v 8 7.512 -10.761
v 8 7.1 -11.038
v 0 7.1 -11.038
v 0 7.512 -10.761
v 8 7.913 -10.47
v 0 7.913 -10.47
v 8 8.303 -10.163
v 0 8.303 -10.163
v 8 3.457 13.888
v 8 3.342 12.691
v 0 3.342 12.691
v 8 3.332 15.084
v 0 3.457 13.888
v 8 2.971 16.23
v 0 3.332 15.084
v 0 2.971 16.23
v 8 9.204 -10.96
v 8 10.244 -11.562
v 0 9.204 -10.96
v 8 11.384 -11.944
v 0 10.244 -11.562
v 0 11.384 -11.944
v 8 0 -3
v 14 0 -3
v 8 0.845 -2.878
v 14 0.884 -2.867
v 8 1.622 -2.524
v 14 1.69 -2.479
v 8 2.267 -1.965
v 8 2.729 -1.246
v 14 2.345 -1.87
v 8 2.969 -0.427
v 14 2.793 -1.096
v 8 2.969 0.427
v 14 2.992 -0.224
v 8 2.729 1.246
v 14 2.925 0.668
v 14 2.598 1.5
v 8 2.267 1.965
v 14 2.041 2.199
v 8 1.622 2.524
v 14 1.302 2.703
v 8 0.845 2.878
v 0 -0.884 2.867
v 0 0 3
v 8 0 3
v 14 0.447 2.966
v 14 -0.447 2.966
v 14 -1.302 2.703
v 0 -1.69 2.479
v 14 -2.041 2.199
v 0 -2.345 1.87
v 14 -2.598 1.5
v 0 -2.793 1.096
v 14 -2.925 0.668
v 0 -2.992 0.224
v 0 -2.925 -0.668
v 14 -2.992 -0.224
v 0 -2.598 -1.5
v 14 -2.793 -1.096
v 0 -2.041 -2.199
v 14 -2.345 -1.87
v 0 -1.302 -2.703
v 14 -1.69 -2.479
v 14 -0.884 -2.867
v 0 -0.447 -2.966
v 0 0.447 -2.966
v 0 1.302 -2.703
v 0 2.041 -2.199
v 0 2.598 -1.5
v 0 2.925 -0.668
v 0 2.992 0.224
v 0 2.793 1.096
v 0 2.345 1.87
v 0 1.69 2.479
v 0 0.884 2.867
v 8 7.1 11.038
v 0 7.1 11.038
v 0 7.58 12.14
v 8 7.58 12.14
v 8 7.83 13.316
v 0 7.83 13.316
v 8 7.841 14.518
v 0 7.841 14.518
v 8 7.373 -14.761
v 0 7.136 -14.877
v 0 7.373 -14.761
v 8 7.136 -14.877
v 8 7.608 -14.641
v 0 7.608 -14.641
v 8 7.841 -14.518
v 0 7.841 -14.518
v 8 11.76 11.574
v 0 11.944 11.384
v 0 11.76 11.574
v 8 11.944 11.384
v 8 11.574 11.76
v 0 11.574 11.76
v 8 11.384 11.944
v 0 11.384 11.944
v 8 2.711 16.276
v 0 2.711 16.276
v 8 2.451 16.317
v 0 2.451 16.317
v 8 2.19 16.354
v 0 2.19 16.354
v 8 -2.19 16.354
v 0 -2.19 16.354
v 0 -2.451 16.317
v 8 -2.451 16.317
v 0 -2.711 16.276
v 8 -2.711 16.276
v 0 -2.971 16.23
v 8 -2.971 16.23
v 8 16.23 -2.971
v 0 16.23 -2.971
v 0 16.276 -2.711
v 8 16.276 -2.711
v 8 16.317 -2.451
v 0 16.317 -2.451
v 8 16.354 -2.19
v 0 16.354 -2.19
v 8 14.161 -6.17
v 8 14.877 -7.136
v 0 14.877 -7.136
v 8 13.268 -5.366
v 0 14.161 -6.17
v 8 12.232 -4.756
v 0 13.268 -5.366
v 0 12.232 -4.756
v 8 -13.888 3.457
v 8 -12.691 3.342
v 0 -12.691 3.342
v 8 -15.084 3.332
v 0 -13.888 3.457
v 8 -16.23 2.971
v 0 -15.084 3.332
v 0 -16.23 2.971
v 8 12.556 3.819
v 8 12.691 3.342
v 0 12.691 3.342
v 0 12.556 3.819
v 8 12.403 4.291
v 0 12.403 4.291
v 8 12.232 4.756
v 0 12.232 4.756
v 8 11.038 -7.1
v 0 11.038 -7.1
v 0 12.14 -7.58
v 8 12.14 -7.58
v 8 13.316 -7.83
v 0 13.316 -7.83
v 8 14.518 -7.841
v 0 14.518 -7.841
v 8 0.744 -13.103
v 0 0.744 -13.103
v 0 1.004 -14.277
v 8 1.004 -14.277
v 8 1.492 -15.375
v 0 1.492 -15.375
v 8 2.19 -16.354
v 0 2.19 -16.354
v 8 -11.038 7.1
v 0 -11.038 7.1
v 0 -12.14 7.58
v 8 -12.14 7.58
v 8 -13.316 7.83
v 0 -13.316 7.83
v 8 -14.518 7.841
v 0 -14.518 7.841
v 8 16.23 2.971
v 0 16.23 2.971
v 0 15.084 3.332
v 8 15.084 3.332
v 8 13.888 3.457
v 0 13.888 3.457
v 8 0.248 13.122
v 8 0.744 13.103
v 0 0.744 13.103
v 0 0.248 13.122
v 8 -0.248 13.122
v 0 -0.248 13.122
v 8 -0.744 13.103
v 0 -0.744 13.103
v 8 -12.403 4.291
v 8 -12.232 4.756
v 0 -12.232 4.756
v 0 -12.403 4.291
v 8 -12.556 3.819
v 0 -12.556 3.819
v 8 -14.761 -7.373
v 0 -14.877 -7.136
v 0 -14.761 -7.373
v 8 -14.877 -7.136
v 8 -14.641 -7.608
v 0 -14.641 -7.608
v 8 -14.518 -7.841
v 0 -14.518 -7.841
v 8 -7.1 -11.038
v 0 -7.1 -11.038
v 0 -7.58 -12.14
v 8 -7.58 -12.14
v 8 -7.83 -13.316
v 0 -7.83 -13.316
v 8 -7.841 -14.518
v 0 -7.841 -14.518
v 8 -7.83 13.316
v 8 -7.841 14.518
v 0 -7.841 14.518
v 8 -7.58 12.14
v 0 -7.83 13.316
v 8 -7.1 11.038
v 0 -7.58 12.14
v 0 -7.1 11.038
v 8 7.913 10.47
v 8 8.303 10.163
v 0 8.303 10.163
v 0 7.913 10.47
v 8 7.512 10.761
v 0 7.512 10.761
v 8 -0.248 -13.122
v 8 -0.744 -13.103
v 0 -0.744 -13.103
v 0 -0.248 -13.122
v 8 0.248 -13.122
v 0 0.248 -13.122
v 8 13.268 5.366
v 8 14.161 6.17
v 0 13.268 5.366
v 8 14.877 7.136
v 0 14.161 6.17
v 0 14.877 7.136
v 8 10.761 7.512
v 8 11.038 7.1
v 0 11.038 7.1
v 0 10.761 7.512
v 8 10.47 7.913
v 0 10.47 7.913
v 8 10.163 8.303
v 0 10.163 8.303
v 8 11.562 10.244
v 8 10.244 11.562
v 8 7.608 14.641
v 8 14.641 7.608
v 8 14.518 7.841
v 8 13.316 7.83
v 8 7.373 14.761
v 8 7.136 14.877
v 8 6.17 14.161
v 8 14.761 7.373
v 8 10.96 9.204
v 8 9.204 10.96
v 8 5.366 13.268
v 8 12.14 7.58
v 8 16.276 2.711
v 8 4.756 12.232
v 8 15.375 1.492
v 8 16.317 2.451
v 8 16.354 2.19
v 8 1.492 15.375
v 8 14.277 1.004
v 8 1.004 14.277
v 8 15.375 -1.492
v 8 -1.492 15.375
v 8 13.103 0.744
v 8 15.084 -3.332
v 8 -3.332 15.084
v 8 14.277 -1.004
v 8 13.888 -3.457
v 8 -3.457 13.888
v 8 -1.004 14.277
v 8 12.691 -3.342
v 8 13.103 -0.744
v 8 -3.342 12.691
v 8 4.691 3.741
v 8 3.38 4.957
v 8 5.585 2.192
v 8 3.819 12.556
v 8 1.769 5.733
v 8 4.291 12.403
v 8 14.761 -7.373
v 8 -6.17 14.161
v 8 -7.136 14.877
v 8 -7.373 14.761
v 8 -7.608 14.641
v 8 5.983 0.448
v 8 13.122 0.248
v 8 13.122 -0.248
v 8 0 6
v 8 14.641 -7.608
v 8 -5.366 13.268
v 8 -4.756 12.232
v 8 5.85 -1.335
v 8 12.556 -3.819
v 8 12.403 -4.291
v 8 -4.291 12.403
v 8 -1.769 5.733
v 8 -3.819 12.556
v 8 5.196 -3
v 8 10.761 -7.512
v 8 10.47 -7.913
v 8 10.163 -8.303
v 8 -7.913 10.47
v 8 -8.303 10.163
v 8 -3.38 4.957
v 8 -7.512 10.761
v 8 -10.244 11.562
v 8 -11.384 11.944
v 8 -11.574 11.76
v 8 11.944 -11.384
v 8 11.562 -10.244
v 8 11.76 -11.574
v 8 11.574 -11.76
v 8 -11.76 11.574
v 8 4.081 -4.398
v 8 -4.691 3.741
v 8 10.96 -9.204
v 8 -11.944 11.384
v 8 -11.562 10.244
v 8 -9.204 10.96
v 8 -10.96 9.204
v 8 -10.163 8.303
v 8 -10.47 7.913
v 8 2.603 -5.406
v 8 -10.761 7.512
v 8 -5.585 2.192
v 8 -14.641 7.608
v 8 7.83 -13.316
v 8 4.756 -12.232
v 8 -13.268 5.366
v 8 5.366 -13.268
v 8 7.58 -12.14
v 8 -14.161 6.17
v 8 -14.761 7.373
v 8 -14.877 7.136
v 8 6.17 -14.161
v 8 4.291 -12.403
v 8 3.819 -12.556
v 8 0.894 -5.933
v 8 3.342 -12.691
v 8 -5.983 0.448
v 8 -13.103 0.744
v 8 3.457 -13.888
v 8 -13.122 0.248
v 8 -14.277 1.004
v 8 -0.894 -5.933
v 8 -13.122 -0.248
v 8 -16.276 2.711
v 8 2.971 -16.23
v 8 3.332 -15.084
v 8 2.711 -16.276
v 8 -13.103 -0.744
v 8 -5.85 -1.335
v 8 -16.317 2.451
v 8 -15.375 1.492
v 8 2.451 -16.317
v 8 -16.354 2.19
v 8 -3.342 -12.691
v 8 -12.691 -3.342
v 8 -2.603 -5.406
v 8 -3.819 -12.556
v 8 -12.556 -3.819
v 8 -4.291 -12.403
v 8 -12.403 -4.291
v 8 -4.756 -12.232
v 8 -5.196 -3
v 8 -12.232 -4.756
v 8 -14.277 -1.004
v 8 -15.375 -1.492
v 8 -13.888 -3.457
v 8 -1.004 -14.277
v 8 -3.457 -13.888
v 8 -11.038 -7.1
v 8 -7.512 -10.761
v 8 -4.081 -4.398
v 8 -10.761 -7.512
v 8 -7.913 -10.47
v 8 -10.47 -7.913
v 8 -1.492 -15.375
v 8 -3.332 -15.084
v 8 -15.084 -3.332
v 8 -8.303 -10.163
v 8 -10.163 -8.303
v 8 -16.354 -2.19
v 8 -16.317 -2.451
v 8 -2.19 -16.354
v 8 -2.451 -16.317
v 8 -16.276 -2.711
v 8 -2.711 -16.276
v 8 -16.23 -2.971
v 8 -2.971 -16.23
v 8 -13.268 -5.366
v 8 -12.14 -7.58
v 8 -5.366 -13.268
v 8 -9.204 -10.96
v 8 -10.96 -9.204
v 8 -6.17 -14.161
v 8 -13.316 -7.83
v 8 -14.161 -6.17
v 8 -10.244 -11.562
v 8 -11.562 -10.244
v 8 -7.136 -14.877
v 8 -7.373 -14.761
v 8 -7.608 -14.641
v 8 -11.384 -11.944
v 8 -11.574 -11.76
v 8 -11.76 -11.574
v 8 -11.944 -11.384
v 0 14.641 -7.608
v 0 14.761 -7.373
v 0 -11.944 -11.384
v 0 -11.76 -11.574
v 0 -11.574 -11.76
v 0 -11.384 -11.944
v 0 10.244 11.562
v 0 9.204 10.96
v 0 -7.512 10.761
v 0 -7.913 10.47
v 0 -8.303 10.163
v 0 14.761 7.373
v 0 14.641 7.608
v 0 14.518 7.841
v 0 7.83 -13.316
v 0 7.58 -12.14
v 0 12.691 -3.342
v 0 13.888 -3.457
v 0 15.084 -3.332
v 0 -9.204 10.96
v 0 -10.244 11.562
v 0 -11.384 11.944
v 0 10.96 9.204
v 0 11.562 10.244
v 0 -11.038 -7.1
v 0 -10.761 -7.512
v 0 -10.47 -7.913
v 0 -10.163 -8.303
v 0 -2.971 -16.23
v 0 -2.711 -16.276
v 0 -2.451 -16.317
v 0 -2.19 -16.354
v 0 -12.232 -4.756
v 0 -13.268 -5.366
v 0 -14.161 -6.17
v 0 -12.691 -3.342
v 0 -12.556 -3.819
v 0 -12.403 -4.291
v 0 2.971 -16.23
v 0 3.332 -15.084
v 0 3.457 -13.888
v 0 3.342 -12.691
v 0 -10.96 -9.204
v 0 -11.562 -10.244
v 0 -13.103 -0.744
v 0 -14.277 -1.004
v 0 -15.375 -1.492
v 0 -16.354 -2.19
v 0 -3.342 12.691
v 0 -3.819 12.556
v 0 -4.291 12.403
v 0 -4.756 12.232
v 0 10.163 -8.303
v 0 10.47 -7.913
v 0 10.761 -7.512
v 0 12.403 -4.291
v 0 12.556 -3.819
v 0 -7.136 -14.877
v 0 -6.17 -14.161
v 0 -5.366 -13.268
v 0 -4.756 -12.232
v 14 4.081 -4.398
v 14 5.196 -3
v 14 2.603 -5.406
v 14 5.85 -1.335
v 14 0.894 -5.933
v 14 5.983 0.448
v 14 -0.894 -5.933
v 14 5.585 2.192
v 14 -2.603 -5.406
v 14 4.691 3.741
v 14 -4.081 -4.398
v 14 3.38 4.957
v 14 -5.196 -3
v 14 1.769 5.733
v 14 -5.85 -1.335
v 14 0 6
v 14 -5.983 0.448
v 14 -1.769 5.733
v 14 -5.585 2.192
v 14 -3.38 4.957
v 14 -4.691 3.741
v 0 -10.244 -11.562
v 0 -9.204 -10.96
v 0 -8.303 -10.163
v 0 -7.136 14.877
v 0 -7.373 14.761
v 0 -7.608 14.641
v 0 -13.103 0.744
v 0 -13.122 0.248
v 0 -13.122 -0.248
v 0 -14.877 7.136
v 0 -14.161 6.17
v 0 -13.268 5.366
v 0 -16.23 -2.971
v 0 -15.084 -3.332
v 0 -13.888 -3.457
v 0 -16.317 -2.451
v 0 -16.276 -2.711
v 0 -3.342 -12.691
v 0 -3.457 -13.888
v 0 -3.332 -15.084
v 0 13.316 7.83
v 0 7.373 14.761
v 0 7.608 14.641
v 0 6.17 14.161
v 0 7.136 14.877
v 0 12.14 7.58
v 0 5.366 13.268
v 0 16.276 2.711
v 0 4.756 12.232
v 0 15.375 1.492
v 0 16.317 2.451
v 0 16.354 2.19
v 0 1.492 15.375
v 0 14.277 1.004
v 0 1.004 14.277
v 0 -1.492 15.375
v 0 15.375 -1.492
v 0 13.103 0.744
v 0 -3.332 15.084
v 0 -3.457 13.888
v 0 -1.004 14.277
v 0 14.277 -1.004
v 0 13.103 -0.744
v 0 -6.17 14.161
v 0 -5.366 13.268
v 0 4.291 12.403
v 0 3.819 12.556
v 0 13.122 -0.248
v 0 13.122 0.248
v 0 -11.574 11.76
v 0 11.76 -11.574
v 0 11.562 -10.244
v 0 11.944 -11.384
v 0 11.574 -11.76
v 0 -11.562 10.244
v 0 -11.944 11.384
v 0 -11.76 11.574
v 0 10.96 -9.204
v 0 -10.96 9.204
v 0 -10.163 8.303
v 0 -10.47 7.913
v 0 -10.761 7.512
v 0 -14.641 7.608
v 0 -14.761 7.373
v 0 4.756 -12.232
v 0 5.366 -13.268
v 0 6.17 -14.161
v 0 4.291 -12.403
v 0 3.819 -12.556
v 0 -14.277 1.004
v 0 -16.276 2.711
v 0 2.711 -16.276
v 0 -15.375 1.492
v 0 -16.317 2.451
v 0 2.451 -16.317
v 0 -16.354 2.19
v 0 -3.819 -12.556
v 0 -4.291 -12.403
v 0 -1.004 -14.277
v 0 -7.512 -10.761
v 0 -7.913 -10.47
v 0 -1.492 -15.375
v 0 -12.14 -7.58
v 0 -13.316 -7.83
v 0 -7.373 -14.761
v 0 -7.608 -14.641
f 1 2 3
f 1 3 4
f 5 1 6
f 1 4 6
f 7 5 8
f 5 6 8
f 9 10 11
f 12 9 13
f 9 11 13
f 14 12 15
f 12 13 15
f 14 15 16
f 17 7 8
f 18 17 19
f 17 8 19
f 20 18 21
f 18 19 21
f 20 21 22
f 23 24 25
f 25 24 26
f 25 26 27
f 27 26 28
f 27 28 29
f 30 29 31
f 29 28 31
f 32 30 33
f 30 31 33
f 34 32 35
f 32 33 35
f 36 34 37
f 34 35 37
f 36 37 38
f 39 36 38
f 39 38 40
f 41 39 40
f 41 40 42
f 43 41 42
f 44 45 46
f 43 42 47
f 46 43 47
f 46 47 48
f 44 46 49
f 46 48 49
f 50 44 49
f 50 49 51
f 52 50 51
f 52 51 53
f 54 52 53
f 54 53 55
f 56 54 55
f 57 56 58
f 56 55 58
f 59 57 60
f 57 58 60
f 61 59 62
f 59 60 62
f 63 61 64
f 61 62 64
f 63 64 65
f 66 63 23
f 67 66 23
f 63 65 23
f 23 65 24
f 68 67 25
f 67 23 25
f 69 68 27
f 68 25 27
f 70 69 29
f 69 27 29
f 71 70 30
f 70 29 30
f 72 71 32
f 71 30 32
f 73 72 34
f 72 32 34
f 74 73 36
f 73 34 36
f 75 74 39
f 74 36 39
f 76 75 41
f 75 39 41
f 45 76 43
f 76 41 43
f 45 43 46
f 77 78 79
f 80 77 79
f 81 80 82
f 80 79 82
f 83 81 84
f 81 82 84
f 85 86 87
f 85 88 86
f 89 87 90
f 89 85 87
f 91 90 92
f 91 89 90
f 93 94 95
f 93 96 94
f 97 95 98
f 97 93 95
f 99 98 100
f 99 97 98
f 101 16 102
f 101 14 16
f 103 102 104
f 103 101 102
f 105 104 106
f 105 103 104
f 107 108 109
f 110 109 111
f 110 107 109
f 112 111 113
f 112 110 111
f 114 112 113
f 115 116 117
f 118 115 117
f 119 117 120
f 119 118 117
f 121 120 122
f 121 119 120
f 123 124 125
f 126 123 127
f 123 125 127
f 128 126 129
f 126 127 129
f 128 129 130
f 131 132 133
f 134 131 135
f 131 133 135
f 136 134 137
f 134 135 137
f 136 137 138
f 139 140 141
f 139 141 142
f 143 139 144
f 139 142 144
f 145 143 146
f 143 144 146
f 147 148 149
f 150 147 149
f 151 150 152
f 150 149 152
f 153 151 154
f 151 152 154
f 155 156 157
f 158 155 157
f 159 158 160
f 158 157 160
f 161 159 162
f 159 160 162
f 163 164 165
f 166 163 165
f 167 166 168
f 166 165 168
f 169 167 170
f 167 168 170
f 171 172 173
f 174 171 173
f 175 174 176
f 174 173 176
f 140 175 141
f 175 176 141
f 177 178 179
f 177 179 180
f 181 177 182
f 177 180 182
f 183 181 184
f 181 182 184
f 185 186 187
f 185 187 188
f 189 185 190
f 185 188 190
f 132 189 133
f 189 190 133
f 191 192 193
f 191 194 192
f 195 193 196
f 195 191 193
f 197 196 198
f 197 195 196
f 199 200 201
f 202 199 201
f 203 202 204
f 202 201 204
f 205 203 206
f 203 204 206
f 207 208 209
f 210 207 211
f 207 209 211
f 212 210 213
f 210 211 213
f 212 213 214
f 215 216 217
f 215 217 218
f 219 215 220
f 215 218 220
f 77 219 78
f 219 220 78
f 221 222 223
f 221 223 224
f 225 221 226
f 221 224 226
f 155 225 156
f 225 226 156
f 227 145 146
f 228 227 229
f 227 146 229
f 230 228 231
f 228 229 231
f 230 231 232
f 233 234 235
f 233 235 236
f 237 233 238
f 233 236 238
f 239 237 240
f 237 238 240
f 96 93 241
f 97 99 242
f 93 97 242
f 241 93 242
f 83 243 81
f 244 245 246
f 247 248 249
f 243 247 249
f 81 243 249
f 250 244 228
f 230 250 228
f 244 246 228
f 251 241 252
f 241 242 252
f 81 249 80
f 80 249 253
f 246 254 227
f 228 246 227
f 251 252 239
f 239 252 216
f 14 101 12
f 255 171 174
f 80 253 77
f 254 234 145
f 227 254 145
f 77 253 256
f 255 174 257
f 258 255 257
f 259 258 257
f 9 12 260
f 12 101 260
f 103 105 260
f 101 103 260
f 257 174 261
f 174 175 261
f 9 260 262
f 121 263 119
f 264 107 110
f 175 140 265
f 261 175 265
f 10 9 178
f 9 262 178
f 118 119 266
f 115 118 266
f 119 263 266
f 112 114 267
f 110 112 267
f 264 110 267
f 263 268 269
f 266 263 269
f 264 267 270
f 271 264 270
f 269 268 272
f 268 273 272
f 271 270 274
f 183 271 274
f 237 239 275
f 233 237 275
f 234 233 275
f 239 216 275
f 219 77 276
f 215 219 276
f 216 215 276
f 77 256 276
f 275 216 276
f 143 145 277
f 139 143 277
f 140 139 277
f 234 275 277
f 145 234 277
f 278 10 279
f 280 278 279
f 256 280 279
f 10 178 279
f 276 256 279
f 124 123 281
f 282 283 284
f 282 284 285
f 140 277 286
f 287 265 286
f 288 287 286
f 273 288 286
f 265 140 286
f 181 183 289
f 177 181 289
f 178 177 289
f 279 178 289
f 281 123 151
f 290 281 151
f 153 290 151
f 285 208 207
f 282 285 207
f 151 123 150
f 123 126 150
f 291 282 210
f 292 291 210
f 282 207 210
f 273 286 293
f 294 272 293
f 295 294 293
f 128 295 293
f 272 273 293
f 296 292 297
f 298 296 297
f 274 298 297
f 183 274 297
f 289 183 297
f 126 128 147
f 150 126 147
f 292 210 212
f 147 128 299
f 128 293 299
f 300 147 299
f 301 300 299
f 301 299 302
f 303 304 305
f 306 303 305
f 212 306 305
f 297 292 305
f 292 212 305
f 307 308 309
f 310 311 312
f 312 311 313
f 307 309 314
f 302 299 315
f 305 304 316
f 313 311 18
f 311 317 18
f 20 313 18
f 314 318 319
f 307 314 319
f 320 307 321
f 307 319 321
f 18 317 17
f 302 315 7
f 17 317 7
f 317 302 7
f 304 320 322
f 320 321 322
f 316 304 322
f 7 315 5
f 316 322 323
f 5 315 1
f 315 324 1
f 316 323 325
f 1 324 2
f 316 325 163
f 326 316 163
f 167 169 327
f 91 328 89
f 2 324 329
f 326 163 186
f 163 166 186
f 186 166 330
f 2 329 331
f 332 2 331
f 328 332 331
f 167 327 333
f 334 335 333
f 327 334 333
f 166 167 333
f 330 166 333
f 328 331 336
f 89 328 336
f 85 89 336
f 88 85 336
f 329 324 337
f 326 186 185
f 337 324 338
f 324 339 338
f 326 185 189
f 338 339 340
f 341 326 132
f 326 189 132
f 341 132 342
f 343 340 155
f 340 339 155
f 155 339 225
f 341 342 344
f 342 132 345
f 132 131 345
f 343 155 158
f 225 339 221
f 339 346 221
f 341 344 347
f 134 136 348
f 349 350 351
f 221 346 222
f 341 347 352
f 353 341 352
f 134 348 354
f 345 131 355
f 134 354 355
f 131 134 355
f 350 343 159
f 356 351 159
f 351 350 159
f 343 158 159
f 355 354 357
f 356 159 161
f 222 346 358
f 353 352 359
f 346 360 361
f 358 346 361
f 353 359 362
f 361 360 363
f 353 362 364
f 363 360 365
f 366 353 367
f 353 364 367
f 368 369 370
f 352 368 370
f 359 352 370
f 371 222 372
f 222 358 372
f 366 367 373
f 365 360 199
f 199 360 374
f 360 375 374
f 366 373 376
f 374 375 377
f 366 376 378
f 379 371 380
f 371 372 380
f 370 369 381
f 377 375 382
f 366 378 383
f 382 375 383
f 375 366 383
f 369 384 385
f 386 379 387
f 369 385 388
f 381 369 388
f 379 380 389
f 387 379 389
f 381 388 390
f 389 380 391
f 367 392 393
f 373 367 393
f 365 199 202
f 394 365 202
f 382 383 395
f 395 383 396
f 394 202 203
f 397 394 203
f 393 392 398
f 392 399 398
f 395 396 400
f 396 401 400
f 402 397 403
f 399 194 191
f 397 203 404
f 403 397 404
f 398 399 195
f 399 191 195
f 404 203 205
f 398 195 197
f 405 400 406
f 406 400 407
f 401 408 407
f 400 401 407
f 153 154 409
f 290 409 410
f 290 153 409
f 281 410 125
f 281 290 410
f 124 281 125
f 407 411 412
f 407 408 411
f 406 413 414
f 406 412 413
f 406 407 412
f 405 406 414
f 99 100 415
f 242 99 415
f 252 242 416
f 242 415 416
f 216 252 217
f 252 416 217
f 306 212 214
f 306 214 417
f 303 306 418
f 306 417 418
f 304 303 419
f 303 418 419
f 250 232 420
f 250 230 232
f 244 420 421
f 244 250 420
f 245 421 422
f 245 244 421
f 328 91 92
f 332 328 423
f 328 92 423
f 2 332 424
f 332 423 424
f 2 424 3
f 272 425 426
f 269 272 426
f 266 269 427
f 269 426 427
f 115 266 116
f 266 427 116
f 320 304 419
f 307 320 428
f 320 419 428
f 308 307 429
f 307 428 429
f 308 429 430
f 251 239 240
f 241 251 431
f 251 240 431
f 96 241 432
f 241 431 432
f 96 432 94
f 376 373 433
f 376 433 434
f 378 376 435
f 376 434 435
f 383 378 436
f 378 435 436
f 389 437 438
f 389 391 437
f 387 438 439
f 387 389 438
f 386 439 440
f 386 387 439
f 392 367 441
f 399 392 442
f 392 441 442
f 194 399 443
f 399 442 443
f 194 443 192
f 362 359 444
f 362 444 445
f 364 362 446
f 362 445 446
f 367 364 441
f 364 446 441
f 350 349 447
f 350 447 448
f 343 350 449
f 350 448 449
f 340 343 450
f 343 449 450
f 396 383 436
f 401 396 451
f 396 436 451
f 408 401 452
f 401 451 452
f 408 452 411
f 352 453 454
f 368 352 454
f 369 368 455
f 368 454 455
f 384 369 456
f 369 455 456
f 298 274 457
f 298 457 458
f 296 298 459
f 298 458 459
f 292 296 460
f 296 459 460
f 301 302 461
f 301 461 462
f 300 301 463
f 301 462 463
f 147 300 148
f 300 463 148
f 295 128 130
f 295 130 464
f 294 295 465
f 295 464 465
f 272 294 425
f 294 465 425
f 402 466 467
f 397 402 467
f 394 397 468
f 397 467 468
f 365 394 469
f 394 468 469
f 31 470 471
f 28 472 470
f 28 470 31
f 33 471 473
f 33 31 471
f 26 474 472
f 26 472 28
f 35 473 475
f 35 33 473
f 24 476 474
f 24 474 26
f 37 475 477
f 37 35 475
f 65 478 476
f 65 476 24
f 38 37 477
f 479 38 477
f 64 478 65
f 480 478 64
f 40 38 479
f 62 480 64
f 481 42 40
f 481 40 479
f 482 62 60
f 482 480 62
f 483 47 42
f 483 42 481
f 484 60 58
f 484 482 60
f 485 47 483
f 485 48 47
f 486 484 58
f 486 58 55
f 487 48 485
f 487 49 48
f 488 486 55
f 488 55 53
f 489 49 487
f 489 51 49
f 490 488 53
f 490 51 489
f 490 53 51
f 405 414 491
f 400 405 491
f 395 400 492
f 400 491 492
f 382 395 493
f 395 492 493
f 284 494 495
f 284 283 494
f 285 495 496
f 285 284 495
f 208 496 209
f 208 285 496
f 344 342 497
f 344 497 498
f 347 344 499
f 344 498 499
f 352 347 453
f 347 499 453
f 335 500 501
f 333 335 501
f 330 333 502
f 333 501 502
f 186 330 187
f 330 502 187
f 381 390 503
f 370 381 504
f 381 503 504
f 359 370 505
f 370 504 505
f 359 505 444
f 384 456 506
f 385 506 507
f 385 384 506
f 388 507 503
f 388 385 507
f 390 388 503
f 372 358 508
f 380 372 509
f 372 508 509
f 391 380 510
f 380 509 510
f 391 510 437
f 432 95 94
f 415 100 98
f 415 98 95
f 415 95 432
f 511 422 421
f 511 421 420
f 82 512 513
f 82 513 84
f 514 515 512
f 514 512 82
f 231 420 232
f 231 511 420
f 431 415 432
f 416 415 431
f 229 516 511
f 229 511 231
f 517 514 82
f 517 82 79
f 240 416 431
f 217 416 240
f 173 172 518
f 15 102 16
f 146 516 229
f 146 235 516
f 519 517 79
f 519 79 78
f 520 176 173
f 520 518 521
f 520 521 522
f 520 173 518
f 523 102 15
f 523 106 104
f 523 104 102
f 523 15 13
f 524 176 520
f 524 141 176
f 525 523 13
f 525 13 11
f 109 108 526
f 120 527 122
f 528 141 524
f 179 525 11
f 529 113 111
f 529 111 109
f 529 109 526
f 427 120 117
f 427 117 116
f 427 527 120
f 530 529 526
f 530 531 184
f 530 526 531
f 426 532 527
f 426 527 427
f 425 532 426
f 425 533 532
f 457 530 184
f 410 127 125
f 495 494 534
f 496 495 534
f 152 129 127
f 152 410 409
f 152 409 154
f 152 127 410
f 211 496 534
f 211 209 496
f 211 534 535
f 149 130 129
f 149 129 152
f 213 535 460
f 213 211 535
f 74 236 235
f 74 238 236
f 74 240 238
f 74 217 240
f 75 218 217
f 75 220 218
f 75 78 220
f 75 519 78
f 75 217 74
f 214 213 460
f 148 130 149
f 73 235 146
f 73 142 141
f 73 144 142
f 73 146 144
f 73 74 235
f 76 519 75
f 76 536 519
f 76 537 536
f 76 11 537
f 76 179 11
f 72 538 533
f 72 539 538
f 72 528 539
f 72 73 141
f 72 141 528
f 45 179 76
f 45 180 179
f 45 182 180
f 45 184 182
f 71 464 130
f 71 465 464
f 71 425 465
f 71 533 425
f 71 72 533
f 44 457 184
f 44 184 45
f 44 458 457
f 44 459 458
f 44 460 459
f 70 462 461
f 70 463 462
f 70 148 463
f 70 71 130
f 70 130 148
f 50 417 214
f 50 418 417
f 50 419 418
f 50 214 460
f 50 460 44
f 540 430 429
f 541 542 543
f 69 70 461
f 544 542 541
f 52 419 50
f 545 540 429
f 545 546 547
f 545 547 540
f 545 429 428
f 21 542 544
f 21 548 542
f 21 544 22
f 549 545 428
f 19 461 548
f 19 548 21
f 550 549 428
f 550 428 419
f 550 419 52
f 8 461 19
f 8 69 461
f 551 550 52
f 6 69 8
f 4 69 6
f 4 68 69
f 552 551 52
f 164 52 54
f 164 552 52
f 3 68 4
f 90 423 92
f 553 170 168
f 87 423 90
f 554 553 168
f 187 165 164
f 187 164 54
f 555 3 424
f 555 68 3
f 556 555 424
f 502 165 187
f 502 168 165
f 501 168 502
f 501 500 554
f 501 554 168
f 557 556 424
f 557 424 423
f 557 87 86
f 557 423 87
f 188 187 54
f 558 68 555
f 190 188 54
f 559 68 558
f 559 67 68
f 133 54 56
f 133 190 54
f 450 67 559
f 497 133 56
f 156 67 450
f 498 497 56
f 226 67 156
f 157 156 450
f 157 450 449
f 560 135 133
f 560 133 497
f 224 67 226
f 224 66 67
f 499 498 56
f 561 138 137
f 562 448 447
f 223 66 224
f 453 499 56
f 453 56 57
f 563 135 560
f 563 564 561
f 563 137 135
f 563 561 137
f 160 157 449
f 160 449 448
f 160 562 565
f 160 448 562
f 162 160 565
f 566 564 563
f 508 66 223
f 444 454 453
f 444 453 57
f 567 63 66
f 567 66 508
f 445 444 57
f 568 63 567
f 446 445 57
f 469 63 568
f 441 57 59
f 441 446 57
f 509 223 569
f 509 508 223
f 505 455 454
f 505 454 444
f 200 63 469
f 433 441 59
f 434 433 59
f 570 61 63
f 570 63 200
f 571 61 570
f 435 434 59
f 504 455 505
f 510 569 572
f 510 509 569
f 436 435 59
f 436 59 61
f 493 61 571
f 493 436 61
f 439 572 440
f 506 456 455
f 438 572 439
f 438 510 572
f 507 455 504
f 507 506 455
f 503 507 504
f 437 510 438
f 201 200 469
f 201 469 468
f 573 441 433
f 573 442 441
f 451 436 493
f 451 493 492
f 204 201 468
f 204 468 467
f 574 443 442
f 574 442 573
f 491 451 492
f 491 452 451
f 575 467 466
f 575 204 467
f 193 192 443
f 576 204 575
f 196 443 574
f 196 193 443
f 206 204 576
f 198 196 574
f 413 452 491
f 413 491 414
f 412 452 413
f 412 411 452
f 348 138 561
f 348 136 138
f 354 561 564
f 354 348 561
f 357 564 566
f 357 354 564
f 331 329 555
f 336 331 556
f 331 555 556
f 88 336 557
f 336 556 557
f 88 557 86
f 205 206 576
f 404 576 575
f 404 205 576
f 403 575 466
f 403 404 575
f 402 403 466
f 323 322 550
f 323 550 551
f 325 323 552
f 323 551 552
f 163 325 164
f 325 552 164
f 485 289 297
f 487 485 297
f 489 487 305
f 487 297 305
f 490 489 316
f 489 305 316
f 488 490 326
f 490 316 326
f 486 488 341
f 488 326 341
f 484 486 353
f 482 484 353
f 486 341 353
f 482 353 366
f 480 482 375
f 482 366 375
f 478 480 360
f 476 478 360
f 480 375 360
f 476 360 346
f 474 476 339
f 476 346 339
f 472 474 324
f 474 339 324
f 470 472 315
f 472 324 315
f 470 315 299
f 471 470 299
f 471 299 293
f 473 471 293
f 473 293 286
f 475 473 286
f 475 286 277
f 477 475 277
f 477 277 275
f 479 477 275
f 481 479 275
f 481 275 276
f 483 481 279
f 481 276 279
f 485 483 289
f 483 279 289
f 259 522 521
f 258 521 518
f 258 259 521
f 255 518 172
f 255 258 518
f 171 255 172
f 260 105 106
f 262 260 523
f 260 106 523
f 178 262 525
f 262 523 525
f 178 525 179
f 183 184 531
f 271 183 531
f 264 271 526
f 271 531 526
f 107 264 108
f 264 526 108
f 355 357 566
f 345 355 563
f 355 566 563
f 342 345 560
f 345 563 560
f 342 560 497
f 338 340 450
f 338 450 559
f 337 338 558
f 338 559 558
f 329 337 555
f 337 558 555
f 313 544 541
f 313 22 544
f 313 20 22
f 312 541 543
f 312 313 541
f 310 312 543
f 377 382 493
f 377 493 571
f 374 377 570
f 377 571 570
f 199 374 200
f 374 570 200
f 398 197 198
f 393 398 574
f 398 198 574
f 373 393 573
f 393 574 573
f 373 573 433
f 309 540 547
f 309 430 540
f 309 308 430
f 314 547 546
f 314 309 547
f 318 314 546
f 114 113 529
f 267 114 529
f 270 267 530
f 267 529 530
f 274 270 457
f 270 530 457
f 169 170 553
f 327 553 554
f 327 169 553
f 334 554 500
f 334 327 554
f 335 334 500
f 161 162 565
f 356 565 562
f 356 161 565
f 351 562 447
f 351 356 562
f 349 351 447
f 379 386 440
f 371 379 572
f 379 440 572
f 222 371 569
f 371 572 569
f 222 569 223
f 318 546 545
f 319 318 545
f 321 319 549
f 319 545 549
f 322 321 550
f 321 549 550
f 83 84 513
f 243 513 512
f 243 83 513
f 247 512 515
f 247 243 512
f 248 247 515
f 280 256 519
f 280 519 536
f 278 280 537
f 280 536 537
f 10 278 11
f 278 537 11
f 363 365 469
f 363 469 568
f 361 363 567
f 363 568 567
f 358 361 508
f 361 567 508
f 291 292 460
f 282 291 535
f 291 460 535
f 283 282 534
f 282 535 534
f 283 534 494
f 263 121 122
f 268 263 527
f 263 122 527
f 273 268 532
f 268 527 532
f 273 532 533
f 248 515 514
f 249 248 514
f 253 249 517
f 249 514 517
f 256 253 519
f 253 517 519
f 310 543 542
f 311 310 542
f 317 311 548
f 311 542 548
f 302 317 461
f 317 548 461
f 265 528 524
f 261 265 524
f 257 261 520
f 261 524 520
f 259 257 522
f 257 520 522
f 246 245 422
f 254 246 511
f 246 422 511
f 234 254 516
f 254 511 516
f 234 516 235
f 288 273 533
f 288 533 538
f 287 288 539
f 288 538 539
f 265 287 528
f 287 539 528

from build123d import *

# Parameters (mm, degrees)
BASPROSKE_W         = 8
BASPROSKE_H         = 16.5
TOOTHCUT_DEPTH      = 25.667792767
TEETHCUTS_COUNT     = 20
TEETHCUTS_ANGLE     = 342
BORSKE_R            = 3
BORE_DEPTH          = 50.0000508
SKETCH1_R           = 6
BOSS_EXTRUDE1_DEPTH = 6
SKETCH2_R           = 3
CUT_EXTRUDE1_DEPTH  = 6


with BuildPart() as part:
    # BasProSke → Base-Revolve (revolve)
    with BuildSketch(Plane(origin=(0, 0, 0), x_dir=(1, 0, 0), z_dir=(0, 1, 0)), mode=Mode.PRIVATE) as base_revolve_sk:
        with Locations((4, 8.25)):
            Rectangle(BASPROSKE_W, BASPROSKE_H)
    revolve(base_revolve_sk.sketch.rotate(Axis((-10, 0, 0), (1, 0, 0)), 180), axis=Axis((-10, 0, 0), (1, 0, 0)))

    # TooCutSke → ToothCut (cut, through all)
    with BuildSketch(Plane(origin=(0, 0, 0), x_dir=(0, 0, -1), z_dir=(1, 0, 0))):
        with BuildLine():
            ThreePointArc((0.74381438, 13.102904875), (0, 13.124), (-0.74381438, 13.102904875))
            ThreePointArc((-0.74381438, 13.102904875), (-1.226473103, 14.852072512), (-2.209965745, 16.376962373))
            ThreePointArc((-2.209965745, 16.376962373), (0, 16.5254), (2.209965745, 16.376962373))
            ThreePointArc((2.209965745, 16.376962373), (1.226473103, 14.852072512), (0.74381438, 13.102904875))
        make_face()
    toothcut = extrude(amount=TOOTHCUT_DEPTH, mode=Mode.SUBTRACT)

    # TeethCuts: ToothCut ×20 about axis
    teethcuts_axis = Axis((-10, 0, 0), (1, 0, 0))
    for i in range(1, TEETHCUTS_COUNT):
        add(toothcut.rotate(teethcuts_axis, i * TEETHCUTS_ANGLE / (TEETHCUTS_COUNT - 1)), mode=Mode.SUBTRACT)

    # BorSke → Bore (cut, symmetric)
    with BuildSketch(Plane(origin=(0, 0, 0), x_dir=(0, 0, -1), z_dir=(1, 0, 0))):
        with Locations(Location((0, 0, 0), (0, 0, 180))):
            Circle(BORSKE_R)
    extrude(amount=BORE_DEPTH, both=True, mode=Mode.SUBTRACT)

    # Sketch1 → Boss-Extrude1 (add)
    with BuildSketch(Plane(origin=(8, 0, 0), x_dir=(0, 0, -1), z_dir=(1, 0, 0))):
        with Locations(Location((0, 0, 0), (0, 0, 180))):
            Circle(SKETCH1_R)
    extrude(amount=BOSS_EXTRUDE1_DEPTH)

    # Sketch2 → Cut-Extrude1 (cut)
    with BuildSketch(Plane(origin=(14, 0, 0), x_dir=(0, 0, -1), z_dir=(1, 0, 0))):
        Circle(SKETCH2_R)
    extrude(amount=-CUT_EXTRUDE1_DEPTH, mode=Mode.SUBTRACT)


solid = part.part
